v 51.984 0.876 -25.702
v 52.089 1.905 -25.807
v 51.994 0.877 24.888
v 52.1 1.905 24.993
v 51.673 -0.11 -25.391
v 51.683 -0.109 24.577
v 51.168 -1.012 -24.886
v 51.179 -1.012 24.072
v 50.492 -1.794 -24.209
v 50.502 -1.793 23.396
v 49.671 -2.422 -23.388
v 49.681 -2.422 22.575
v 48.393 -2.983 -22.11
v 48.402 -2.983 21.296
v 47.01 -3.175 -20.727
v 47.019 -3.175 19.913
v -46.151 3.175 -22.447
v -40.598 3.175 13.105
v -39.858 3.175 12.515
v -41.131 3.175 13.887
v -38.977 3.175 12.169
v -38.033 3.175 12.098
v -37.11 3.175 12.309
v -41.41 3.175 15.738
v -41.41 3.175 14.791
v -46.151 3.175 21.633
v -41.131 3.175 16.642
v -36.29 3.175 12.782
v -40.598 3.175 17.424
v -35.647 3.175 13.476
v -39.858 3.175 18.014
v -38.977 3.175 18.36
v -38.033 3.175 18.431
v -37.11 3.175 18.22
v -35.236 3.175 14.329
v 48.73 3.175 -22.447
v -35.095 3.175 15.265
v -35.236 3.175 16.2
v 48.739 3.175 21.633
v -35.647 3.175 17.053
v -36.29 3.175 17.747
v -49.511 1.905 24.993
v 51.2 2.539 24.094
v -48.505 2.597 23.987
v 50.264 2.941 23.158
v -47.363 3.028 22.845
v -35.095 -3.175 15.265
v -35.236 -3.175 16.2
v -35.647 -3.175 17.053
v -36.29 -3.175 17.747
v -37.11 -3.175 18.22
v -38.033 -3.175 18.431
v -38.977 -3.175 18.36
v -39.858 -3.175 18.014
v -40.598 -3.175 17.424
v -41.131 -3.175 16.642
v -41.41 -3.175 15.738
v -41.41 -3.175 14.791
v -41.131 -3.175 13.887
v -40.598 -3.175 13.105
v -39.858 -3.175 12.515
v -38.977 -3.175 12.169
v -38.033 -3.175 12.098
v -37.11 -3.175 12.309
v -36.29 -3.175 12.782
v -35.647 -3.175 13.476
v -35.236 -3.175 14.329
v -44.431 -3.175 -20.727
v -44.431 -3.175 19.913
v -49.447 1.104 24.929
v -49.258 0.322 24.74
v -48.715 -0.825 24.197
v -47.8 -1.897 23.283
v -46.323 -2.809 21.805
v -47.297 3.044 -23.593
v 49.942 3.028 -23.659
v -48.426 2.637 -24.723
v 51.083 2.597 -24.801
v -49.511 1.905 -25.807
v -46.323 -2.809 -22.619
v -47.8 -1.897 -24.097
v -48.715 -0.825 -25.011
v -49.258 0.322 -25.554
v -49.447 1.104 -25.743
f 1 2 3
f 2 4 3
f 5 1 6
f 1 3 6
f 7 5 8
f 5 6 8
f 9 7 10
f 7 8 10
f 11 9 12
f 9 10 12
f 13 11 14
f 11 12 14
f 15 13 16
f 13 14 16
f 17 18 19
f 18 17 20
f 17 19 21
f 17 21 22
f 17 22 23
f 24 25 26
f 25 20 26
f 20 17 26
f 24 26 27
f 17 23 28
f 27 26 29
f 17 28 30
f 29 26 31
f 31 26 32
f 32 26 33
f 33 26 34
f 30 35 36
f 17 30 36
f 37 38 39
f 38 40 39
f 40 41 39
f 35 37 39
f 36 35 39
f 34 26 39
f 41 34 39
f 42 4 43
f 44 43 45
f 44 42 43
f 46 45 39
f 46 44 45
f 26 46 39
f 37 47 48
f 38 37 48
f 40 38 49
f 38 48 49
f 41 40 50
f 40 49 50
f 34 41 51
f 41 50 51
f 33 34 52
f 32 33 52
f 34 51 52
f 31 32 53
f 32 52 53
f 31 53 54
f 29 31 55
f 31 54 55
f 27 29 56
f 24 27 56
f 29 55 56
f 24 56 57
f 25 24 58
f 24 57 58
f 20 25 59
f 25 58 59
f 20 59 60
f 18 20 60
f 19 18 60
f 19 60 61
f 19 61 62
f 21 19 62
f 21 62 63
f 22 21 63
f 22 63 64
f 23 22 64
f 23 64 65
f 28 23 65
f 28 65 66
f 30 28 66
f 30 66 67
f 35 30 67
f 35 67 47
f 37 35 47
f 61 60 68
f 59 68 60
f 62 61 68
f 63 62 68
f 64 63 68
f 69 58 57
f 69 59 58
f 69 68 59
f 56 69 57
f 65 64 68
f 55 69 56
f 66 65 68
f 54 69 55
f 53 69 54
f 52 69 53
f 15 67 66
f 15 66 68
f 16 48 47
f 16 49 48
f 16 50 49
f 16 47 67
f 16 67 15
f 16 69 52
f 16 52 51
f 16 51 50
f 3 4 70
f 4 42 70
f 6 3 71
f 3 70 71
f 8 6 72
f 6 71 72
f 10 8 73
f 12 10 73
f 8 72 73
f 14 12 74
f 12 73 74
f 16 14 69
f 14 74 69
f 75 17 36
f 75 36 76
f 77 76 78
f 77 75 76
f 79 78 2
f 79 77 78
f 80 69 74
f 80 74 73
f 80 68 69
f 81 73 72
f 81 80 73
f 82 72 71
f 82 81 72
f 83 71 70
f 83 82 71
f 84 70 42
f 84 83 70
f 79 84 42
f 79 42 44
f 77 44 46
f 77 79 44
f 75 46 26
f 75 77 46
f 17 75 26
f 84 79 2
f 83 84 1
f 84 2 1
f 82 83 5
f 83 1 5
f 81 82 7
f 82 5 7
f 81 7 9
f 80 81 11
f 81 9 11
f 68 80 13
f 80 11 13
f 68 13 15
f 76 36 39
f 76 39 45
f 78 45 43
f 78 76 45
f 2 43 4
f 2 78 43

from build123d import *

# Parameters (mm, degrees)
F1_DEPTH    = 3.175
F2_R        = 5.08
F3_R        = 3.175
F4_DEPTH    = 25.4
F5_T1_DEPTH = 118.410793948
F5_T3_DEPTH = 67.600521864
F5_T5_DEPTH = 118.4005208253
F5_T7_DEPTH = 67.6005208253


# Not quite as in the source:
# - a fillet or chamfer that OpenCascade refuses, or shapes differently, is made with other operations: its cross-section is extruded or revolved along the edge and cut away or added


with BuildPart() as f1:
    # F0 (on Front) → F1 (new body, symmetric)
    with BuildSketch(Plane.XZ):
        Polygon((52.0995333791, 24.9929322481), (-49.5107397437, 24.9929322481), (-49.5107397437, -25.8070677519), (52.0892602563, -25.8070677519), align=None)
    extrude(amount=F1_DEPTH, both=True)

    # F2
    f2_edges = [f1.edges().sort_by_distance(p)[0] for p in [
        (-49.51074, -3.175, -0.407068),
        (1.294397, -3.175, 24.992932),
        (52.094397, -3.175, -0.407068),
        (1.28926, -3.175, -25.807068),
    ]]
    fillet(f2_edges, radius=F2_R)

    # F3 (on face) → F4 (cut)
    with BuildSketch(Plane.XZ.offset(3.175)):
        with Locations((-38.2700785995, 15.264518559)):
            Circle(F3_R)
    extrude(amount=-F4_DEPTH, mode=Mode.SUBTRACT)

    # F5: fillet of radius 5.08 on 4 edges, made by hand

    # F5_s2 → F5_t1 (cut)
    with BuildSketch(Plane.YZ.offset(-57.9110001563)):
        with BuildLine():
            ThreePointArc((1.905, 24.9929322481), (2.8469048812, 23.4288793073), (3.175, 21.6328280831))
            Line((3.175, 21.6328280831), (3.175, 24.9929322481))
            Line((3.175, 24.9929322481), (1.905, 24.9929322481))
        make_face()
    extrude(amount=F5_T1_DEPTH, mode=Mode.SUBTRACT)

    # F5_s4 → F5_t3 (cut)
    with BuildSketch(Plane(origin=(-0.0069155089, 0, -34.196793092), x_dir=(0, 1, 0), z_dir=(0.0002022268, 0, 0.9999999796))):
        with BuildLine():
            ThreePointArc((3.175, -48.7343739074), (2.8469048812, -50.5304251316), (1.905, -52.0944780725))
            Line((1.905, -52.0944780725), (3.175, -52.0944780725))
            Line((3.175, -52.0944780725), (3.175, -48.7343739074))
        make_face()
    extrude(amount=F5_T3_DEPTH, mode=Mode.SUBTRACT)

    # F5_s6 → F5_t5 (cut)
    with BuildSketch(Plane.YZ.offset(-57.9110001563)):
        with BuildLine():
            ThreePointArc((3.175, -22.4469635868), (2.8469048812, -24.243014811), (1.905, -25.8070677519))
            Line((1.905, -25.8070677519), (3.175, -25.8070677519))
            Line((3.175, -25.8070677519), (3.175, -22.4469635868))
        make_face()
    extrude(amount=F5_T5_DEPTH, mode=Mode.SUBTRACT)

    # F5_s8 → F5_t7 (cut)
    with BuildSketch(Plane.XY.offset(-34.2073281645)):
        with BuildLine():
            ThreePointArc((-49.5107397437, 1.905), (-47.9466868029, 2.8469048812), (-46.1506355787, 3.175))
            Line((-46.1506355787, 3.175), (-49.5107397437, 3.175))
            Line((-49.5107397437, 3.175), (-49.5107397437, 1.905))
        make_face()
    extrude(amount=F5_T7_DEPTH, mode=Mode.SUBTRACT)


solid = f1.part
